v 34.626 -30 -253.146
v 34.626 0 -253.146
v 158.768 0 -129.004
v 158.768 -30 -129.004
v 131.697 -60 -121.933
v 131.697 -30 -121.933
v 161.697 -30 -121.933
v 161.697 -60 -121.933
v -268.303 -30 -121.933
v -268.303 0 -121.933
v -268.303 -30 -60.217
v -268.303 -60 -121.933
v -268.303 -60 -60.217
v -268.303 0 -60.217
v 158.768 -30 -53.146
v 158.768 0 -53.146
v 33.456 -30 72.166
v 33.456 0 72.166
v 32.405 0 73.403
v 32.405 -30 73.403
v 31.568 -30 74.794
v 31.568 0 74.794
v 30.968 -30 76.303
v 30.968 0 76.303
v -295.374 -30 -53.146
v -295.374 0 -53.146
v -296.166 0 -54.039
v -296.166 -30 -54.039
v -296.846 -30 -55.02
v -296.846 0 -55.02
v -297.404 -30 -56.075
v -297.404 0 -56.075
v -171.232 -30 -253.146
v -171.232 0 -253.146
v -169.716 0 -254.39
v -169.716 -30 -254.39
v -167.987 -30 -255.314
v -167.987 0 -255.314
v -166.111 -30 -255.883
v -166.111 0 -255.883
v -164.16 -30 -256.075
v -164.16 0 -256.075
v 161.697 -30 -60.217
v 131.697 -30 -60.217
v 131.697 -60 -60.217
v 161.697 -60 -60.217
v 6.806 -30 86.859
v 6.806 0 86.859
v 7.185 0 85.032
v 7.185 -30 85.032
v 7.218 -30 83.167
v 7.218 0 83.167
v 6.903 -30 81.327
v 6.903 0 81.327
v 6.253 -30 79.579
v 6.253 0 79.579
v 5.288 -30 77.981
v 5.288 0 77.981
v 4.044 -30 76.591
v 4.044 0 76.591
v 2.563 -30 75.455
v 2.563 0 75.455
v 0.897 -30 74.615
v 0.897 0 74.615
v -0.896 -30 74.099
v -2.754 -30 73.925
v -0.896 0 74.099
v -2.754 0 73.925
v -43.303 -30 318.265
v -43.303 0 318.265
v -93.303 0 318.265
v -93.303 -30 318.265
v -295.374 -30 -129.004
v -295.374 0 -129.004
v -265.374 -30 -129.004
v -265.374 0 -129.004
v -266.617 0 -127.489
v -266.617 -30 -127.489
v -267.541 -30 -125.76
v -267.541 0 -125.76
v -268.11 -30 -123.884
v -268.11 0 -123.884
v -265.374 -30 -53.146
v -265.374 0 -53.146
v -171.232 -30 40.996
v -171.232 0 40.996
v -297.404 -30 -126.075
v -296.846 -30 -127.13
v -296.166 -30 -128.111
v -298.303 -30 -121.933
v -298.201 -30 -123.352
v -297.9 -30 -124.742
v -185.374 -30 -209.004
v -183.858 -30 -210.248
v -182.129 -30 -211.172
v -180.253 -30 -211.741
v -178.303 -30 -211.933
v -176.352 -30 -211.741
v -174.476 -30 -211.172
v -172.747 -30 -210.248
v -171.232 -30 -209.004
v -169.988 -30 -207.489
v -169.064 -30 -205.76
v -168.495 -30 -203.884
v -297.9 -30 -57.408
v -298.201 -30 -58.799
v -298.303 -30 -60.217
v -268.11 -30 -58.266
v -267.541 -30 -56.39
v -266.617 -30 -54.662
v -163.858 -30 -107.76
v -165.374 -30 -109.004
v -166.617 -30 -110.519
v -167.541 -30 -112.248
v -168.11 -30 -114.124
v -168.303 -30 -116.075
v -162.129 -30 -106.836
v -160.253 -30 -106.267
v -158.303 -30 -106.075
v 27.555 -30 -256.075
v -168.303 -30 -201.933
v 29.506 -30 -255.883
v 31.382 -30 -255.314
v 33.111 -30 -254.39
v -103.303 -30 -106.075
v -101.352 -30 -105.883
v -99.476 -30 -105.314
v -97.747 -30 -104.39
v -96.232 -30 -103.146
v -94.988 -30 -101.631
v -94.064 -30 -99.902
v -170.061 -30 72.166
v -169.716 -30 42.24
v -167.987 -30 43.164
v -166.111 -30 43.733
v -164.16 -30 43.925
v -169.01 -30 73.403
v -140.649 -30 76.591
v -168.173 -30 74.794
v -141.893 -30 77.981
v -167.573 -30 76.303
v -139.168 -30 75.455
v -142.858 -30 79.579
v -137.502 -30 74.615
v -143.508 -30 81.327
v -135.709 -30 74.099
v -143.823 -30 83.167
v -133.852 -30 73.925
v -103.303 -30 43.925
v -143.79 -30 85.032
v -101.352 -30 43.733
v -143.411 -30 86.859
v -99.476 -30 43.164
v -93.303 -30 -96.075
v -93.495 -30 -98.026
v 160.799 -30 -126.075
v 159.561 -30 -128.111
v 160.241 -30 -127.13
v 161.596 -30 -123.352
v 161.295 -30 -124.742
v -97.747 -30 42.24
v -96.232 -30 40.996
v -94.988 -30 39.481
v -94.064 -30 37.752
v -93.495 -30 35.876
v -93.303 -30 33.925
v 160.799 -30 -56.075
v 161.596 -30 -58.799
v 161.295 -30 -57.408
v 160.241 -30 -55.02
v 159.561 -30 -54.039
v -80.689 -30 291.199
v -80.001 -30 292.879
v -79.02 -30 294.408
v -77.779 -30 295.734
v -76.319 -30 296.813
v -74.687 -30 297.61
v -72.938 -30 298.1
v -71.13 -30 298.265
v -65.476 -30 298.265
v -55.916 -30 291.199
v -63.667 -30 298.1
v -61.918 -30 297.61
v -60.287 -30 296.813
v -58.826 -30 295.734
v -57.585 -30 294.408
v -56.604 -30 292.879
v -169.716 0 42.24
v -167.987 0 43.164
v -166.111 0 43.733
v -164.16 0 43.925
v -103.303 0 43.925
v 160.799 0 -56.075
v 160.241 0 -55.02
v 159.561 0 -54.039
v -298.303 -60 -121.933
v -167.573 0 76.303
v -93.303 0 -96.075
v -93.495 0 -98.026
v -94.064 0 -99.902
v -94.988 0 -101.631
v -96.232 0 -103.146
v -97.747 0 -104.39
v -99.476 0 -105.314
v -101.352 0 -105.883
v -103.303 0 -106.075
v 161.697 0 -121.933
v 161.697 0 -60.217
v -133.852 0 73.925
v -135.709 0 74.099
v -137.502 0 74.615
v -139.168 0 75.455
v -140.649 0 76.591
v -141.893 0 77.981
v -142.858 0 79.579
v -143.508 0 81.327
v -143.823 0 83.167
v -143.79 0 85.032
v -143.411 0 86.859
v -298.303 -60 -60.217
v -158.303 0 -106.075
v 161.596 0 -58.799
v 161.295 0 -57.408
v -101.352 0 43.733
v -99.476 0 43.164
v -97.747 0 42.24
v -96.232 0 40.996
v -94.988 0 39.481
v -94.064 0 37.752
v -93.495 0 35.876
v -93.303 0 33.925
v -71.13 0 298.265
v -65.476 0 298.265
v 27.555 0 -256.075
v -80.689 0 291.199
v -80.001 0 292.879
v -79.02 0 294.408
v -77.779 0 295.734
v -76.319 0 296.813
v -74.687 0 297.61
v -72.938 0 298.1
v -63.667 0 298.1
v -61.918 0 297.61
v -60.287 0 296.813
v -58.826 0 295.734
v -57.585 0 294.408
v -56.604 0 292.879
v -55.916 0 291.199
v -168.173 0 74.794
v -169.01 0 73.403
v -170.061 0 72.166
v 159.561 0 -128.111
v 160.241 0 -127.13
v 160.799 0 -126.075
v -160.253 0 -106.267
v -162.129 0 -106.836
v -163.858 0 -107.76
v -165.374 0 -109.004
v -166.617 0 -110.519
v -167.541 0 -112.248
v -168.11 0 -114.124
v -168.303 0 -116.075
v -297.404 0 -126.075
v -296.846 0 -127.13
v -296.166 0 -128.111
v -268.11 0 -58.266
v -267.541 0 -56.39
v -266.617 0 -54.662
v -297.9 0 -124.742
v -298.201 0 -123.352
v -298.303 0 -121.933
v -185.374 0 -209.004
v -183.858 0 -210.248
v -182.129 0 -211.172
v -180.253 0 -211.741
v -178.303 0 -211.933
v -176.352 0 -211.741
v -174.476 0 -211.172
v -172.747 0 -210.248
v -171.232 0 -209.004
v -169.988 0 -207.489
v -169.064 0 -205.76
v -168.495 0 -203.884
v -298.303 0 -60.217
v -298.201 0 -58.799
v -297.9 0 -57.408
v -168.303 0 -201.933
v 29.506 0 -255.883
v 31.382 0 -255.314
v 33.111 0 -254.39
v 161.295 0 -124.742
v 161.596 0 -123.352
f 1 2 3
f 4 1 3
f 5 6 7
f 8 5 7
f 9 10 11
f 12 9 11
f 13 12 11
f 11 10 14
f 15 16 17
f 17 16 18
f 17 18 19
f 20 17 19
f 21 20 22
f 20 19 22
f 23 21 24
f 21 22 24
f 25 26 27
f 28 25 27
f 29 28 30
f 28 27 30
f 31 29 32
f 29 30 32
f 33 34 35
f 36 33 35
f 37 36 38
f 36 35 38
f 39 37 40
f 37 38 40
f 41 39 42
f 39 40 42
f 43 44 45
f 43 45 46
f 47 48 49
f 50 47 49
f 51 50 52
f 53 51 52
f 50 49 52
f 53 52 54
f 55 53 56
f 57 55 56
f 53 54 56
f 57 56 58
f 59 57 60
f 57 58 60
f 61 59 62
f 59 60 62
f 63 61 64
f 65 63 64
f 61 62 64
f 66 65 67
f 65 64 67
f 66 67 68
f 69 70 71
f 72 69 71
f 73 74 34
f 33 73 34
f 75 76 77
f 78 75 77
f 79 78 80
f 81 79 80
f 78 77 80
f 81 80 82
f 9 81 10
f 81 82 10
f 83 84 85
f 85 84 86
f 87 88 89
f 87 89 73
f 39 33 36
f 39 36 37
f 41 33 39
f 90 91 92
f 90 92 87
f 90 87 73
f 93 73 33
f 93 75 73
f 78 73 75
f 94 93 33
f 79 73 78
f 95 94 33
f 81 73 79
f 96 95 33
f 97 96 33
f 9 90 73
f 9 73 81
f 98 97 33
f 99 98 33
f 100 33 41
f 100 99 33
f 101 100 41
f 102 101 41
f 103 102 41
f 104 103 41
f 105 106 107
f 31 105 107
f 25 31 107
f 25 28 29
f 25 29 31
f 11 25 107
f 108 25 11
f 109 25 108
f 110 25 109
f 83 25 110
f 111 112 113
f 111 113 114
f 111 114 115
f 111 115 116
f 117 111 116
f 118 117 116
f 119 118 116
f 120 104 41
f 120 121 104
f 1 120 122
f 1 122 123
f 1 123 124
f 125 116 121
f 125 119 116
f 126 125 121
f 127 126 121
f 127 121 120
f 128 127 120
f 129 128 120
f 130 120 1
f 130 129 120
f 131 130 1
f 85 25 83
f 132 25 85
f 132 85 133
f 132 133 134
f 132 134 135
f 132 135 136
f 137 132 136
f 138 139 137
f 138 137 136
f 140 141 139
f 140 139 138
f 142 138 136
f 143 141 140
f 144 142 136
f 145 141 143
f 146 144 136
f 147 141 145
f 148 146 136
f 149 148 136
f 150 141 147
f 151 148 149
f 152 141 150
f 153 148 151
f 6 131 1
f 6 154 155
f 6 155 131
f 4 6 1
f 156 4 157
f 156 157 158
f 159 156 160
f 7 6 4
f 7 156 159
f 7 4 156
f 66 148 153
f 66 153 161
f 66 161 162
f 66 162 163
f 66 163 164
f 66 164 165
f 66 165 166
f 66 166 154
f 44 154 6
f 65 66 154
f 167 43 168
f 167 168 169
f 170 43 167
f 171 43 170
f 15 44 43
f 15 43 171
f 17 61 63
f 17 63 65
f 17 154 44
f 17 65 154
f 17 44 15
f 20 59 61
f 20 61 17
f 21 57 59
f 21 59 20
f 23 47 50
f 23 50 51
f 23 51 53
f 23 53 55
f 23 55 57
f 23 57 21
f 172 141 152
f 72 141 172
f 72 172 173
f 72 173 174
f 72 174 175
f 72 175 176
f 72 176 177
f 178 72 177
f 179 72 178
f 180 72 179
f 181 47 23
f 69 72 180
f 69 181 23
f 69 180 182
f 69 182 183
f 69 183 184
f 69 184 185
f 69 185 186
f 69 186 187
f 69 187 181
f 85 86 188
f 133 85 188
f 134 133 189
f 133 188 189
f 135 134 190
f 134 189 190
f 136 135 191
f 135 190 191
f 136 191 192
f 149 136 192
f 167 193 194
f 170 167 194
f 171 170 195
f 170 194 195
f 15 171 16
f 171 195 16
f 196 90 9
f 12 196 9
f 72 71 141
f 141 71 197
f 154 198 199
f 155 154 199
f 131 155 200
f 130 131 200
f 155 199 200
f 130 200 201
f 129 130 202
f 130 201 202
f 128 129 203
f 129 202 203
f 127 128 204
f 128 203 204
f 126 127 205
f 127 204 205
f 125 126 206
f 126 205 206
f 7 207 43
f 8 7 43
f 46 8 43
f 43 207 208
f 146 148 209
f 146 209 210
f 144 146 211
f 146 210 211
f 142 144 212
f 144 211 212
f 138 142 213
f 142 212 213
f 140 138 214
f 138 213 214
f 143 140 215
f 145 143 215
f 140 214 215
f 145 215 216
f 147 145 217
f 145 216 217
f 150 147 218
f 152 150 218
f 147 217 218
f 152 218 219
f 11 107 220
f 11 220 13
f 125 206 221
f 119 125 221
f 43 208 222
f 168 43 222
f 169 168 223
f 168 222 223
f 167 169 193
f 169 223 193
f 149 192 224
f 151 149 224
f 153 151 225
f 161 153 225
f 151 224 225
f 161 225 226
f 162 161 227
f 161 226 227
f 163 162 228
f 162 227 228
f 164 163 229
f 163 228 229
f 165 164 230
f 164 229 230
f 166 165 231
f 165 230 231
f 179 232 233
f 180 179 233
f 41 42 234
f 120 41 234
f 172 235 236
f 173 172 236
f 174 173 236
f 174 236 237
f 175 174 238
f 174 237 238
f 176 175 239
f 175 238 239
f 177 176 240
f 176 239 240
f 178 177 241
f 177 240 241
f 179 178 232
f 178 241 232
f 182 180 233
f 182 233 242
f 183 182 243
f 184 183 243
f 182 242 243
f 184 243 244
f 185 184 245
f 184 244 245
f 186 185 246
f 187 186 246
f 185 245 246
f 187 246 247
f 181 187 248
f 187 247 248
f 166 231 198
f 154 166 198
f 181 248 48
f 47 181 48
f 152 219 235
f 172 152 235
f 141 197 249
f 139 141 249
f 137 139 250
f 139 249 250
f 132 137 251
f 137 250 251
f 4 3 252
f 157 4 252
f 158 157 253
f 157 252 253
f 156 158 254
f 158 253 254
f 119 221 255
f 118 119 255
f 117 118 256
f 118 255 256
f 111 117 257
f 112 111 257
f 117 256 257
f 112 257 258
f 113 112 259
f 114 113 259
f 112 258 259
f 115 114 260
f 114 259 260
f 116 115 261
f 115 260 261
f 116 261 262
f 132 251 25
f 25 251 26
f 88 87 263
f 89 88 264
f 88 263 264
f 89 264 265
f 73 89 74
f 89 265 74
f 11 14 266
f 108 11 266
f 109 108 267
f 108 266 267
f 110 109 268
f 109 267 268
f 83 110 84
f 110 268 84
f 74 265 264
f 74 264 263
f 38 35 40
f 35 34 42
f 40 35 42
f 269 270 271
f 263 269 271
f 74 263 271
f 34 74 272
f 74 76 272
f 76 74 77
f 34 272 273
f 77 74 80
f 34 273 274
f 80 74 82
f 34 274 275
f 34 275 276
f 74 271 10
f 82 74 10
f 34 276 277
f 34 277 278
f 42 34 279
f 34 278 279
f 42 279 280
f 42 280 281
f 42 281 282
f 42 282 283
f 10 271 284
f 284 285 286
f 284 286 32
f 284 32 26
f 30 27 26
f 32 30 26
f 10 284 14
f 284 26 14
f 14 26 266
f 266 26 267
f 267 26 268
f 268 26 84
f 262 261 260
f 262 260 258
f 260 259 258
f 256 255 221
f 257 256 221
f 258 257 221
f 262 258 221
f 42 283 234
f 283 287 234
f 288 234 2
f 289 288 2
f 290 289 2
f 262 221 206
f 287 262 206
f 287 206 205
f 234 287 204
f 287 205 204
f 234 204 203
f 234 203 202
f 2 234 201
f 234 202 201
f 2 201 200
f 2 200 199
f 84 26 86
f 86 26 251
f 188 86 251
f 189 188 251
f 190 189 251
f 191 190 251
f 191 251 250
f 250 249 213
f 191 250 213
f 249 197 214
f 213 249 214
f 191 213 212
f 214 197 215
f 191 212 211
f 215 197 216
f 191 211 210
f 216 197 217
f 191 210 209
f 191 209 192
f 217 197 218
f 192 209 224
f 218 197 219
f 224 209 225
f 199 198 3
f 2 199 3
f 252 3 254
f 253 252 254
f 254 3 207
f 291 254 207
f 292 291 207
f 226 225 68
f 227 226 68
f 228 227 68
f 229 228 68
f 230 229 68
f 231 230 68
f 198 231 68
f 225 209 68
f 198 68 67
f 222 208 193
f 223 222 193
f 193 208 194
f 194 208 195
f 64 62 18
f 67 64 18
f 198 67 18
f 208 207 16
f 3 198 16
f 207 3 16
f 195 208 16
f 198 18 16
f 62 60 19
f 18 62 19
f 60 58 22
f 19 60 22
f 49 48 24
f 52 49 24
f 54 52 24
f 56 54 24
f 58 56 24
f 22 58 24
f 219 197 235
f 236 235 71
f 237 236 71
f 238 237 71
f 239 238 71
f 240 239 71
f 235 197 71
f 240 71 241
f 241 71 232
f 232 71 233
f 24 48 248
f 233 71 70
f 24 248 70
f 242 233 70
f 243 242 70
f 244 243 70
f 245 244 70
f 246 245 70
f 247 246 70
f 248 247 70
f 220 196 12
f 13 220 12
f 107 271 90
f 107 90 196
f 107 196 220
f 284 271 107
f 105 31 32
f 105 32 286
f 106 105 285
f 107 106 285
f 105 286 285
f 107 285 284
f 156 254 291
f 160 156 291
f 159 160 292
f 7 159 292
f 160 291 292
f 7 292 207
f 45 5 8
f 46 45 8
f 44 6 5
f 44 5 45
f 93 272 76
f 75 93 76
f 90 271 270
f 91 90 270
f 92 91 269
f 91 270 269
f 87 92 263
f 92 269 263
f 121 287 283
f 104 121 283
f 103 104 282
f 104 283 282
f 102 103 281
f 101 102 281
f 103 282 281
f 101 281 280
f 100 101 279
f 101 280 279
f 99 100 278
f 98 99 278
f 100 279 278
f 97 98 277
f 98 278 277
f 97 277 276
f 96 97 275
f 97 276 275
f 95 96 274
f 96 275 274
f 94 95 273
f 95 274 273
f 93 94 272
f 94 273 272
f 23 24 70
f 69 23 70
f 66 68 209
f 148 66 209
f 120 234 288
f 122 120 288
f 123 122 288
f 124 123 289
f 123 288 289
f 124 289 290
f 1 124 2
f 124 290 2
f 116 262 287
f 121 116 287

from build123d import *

# Parameters (mm, degrees)
F1_DEPTH = 30
F0_W     = 30
F0_H     = 61.715728
F2_DEPTH = 60


with BuildPart() as f1:
    # F0 (on Front) → F1 (new body)
    with BuildSketch(Plane.XZ):
        with BuildLine():
            Line((-168.30257, -116.075176), (-168.30257, -201.93304))
            ThreePointArc((-168.30257, -201.93304), (-174.475736, -211.171836), (-185.373638, -209.004108))
            Line((-185.373638, -209.004108), (-265.373638, -129.004108))
            ThreePointArc((-265.373638, -129.004108), (-267.541366, -125.759875), (-268.30257, -121.93304))
            Line((-268.30257, -121.93304), (-298.30257, -121.93304))
            ThreePointArc((-298.30257, -121.93304), (-298.07544, -124.052242), (-297.404367, -126.075176))
            ThreePointArc((-297.404367, -126.075176), (-296.520542, -127.630843), (-295.373638, -129.004108))
            Line((-295.373638, -129.004108), (-171.231502, -253.146244))
            ThreePointArc((-171.231502, -253.146244), (-167.987269, -255.313971), (-164.160435, -256.075176))
            Line((-164.160435, -256.075176), (27.555294, -256.075176))
            ThreePointArc((27.555294, -256.075176), (31.382128, -255.313971), (34.626362, -253.146244))
            Line((34.626362, -253.146244), (158.768498, -129.004108))
            ThreePointArc((158.768498, -129.004108), (159.915401, -127.630843), (160.799227, -126.075176))
            ThreePointArc((160.799227, -126.075176), (161.4703, -124.052242), (161.69743, -121.93304))
            Line((161.69743, -121.93304), (131.69743, -121.93304))
            Line((131.69743, -121.93304), (131.69743, -60.217312))
            Line((131.69743, -60.217312), (161.69743, -60.217312))
            ThreePointArc((161.69743, -60.217312), (161.4703, -58.09811), (160.799227, -56.075176))
            ThreePointArc((160.799227, -56.075176), (159.915401, -54.51951), (158.768498, -53.146244))
            Line((158.768498, -53.146244), (33.456261, 72.165993))
            ThreePointArc((33.456261, 72.165993), (31.958527, 74.081905), (30.967545, 76.302689))
            Line((30.967545, 76.302689), (-43.30257, 318.264572))
            Line((-43.30257, 318.264572), (-93.30257, 318.264572))
            Line((-93.30257, 318.264572), (-167.572686, 76.302689))
            ThreePointArc((-167.572686, 76.302689), (-168.563667, 74.081905), (-170.061401, 72.165993))
            Line((-170.061401, 72.165993), (-295.373638, -53.146244))
            ThreePointArc((-295.373638, -53.146244), (-296.520542, -54.51951), (-297.404367, -56.075176))
            ThreePointArc((-297.404367, -56.075176), (-298.07544, -58.09811), (-298.30257, -60.217312))
            Line((-298.30257, -60.217312), (-268.30257, -60.217312))
            ThreePointArc((-268.30257, -60.217312), (-267.541366, -56.390477), (-265.373638, -53.146244))
            Line((-265.373638, -53.146244), (-171.231502, 40.995892))
            ThreePointArc((-171.231502, 40.995892), (-167.987269, 43.163619), (-164.160435, 43.924824))
            Line((-164.160435, 43.924824), (-103.30257, 43.924824))
            ThreePointArc((-103.30257, 43.924824), (-96.231502, 40.995892), (-93.30257, 33.924824))
            Line((-93.30257, 33.924824), (-93.30257, -96.075176))
            ThreePointArc((-93.30257, -96.075176), (-96.231502, -103.146244), (-103.30257, -106.075176))
            Line((-103.30257, -106.075176), (-158.30257, -106.075176))
            ThreePointArc((-158.30257, -106.075176), (-165.373638, -109.004108), (-168.30257, -116.075176))
        make_face()
        with BuildLine():
            Line((-2.753531, 73.924824), (-133.85161, 73.924824))
            ThreePointArc((-133.85161, 73.924824), (-141.893492, 77.981076), (-143.411393, 86.859196))
            Line((-143.411393, 86.859196), (-80.689379, 291.198944))
            ThreePointArc((-80.689379, 291.198944), (-77.073344, 296.306453), (-71.129596, 298.264572))
            Line((-71.129596, 298.264572), (-65.475545, 298.264572))
            ThreePointArc((-65.475545, 298.264572), (-59.531797, 296.306453), (-55.915761, 291.198944))
            Line((-55.915761, 291.198944), (6.806253, 86.859196))
            ThreePointArc((6.806253, 86.859196), (5.288351, 77.981076), (-2.753531, 73.924824))
        make_face(mode=Mode.SUBTRACT)
    extrude(amount=F1_DEPTH)

    # F0 (on Front) → F2 (join)
    with BuildSketch(Plane.XZ):
        with Locations((-283.30257, -91.075176)):
            Rectangle(F0_W, F0_H)
        with Locations((146.69743, -91.075176)):
            Rectangle(F0_W, F0_H)
    extrude(amount=F2_DEPTH)


solid = f1.part
